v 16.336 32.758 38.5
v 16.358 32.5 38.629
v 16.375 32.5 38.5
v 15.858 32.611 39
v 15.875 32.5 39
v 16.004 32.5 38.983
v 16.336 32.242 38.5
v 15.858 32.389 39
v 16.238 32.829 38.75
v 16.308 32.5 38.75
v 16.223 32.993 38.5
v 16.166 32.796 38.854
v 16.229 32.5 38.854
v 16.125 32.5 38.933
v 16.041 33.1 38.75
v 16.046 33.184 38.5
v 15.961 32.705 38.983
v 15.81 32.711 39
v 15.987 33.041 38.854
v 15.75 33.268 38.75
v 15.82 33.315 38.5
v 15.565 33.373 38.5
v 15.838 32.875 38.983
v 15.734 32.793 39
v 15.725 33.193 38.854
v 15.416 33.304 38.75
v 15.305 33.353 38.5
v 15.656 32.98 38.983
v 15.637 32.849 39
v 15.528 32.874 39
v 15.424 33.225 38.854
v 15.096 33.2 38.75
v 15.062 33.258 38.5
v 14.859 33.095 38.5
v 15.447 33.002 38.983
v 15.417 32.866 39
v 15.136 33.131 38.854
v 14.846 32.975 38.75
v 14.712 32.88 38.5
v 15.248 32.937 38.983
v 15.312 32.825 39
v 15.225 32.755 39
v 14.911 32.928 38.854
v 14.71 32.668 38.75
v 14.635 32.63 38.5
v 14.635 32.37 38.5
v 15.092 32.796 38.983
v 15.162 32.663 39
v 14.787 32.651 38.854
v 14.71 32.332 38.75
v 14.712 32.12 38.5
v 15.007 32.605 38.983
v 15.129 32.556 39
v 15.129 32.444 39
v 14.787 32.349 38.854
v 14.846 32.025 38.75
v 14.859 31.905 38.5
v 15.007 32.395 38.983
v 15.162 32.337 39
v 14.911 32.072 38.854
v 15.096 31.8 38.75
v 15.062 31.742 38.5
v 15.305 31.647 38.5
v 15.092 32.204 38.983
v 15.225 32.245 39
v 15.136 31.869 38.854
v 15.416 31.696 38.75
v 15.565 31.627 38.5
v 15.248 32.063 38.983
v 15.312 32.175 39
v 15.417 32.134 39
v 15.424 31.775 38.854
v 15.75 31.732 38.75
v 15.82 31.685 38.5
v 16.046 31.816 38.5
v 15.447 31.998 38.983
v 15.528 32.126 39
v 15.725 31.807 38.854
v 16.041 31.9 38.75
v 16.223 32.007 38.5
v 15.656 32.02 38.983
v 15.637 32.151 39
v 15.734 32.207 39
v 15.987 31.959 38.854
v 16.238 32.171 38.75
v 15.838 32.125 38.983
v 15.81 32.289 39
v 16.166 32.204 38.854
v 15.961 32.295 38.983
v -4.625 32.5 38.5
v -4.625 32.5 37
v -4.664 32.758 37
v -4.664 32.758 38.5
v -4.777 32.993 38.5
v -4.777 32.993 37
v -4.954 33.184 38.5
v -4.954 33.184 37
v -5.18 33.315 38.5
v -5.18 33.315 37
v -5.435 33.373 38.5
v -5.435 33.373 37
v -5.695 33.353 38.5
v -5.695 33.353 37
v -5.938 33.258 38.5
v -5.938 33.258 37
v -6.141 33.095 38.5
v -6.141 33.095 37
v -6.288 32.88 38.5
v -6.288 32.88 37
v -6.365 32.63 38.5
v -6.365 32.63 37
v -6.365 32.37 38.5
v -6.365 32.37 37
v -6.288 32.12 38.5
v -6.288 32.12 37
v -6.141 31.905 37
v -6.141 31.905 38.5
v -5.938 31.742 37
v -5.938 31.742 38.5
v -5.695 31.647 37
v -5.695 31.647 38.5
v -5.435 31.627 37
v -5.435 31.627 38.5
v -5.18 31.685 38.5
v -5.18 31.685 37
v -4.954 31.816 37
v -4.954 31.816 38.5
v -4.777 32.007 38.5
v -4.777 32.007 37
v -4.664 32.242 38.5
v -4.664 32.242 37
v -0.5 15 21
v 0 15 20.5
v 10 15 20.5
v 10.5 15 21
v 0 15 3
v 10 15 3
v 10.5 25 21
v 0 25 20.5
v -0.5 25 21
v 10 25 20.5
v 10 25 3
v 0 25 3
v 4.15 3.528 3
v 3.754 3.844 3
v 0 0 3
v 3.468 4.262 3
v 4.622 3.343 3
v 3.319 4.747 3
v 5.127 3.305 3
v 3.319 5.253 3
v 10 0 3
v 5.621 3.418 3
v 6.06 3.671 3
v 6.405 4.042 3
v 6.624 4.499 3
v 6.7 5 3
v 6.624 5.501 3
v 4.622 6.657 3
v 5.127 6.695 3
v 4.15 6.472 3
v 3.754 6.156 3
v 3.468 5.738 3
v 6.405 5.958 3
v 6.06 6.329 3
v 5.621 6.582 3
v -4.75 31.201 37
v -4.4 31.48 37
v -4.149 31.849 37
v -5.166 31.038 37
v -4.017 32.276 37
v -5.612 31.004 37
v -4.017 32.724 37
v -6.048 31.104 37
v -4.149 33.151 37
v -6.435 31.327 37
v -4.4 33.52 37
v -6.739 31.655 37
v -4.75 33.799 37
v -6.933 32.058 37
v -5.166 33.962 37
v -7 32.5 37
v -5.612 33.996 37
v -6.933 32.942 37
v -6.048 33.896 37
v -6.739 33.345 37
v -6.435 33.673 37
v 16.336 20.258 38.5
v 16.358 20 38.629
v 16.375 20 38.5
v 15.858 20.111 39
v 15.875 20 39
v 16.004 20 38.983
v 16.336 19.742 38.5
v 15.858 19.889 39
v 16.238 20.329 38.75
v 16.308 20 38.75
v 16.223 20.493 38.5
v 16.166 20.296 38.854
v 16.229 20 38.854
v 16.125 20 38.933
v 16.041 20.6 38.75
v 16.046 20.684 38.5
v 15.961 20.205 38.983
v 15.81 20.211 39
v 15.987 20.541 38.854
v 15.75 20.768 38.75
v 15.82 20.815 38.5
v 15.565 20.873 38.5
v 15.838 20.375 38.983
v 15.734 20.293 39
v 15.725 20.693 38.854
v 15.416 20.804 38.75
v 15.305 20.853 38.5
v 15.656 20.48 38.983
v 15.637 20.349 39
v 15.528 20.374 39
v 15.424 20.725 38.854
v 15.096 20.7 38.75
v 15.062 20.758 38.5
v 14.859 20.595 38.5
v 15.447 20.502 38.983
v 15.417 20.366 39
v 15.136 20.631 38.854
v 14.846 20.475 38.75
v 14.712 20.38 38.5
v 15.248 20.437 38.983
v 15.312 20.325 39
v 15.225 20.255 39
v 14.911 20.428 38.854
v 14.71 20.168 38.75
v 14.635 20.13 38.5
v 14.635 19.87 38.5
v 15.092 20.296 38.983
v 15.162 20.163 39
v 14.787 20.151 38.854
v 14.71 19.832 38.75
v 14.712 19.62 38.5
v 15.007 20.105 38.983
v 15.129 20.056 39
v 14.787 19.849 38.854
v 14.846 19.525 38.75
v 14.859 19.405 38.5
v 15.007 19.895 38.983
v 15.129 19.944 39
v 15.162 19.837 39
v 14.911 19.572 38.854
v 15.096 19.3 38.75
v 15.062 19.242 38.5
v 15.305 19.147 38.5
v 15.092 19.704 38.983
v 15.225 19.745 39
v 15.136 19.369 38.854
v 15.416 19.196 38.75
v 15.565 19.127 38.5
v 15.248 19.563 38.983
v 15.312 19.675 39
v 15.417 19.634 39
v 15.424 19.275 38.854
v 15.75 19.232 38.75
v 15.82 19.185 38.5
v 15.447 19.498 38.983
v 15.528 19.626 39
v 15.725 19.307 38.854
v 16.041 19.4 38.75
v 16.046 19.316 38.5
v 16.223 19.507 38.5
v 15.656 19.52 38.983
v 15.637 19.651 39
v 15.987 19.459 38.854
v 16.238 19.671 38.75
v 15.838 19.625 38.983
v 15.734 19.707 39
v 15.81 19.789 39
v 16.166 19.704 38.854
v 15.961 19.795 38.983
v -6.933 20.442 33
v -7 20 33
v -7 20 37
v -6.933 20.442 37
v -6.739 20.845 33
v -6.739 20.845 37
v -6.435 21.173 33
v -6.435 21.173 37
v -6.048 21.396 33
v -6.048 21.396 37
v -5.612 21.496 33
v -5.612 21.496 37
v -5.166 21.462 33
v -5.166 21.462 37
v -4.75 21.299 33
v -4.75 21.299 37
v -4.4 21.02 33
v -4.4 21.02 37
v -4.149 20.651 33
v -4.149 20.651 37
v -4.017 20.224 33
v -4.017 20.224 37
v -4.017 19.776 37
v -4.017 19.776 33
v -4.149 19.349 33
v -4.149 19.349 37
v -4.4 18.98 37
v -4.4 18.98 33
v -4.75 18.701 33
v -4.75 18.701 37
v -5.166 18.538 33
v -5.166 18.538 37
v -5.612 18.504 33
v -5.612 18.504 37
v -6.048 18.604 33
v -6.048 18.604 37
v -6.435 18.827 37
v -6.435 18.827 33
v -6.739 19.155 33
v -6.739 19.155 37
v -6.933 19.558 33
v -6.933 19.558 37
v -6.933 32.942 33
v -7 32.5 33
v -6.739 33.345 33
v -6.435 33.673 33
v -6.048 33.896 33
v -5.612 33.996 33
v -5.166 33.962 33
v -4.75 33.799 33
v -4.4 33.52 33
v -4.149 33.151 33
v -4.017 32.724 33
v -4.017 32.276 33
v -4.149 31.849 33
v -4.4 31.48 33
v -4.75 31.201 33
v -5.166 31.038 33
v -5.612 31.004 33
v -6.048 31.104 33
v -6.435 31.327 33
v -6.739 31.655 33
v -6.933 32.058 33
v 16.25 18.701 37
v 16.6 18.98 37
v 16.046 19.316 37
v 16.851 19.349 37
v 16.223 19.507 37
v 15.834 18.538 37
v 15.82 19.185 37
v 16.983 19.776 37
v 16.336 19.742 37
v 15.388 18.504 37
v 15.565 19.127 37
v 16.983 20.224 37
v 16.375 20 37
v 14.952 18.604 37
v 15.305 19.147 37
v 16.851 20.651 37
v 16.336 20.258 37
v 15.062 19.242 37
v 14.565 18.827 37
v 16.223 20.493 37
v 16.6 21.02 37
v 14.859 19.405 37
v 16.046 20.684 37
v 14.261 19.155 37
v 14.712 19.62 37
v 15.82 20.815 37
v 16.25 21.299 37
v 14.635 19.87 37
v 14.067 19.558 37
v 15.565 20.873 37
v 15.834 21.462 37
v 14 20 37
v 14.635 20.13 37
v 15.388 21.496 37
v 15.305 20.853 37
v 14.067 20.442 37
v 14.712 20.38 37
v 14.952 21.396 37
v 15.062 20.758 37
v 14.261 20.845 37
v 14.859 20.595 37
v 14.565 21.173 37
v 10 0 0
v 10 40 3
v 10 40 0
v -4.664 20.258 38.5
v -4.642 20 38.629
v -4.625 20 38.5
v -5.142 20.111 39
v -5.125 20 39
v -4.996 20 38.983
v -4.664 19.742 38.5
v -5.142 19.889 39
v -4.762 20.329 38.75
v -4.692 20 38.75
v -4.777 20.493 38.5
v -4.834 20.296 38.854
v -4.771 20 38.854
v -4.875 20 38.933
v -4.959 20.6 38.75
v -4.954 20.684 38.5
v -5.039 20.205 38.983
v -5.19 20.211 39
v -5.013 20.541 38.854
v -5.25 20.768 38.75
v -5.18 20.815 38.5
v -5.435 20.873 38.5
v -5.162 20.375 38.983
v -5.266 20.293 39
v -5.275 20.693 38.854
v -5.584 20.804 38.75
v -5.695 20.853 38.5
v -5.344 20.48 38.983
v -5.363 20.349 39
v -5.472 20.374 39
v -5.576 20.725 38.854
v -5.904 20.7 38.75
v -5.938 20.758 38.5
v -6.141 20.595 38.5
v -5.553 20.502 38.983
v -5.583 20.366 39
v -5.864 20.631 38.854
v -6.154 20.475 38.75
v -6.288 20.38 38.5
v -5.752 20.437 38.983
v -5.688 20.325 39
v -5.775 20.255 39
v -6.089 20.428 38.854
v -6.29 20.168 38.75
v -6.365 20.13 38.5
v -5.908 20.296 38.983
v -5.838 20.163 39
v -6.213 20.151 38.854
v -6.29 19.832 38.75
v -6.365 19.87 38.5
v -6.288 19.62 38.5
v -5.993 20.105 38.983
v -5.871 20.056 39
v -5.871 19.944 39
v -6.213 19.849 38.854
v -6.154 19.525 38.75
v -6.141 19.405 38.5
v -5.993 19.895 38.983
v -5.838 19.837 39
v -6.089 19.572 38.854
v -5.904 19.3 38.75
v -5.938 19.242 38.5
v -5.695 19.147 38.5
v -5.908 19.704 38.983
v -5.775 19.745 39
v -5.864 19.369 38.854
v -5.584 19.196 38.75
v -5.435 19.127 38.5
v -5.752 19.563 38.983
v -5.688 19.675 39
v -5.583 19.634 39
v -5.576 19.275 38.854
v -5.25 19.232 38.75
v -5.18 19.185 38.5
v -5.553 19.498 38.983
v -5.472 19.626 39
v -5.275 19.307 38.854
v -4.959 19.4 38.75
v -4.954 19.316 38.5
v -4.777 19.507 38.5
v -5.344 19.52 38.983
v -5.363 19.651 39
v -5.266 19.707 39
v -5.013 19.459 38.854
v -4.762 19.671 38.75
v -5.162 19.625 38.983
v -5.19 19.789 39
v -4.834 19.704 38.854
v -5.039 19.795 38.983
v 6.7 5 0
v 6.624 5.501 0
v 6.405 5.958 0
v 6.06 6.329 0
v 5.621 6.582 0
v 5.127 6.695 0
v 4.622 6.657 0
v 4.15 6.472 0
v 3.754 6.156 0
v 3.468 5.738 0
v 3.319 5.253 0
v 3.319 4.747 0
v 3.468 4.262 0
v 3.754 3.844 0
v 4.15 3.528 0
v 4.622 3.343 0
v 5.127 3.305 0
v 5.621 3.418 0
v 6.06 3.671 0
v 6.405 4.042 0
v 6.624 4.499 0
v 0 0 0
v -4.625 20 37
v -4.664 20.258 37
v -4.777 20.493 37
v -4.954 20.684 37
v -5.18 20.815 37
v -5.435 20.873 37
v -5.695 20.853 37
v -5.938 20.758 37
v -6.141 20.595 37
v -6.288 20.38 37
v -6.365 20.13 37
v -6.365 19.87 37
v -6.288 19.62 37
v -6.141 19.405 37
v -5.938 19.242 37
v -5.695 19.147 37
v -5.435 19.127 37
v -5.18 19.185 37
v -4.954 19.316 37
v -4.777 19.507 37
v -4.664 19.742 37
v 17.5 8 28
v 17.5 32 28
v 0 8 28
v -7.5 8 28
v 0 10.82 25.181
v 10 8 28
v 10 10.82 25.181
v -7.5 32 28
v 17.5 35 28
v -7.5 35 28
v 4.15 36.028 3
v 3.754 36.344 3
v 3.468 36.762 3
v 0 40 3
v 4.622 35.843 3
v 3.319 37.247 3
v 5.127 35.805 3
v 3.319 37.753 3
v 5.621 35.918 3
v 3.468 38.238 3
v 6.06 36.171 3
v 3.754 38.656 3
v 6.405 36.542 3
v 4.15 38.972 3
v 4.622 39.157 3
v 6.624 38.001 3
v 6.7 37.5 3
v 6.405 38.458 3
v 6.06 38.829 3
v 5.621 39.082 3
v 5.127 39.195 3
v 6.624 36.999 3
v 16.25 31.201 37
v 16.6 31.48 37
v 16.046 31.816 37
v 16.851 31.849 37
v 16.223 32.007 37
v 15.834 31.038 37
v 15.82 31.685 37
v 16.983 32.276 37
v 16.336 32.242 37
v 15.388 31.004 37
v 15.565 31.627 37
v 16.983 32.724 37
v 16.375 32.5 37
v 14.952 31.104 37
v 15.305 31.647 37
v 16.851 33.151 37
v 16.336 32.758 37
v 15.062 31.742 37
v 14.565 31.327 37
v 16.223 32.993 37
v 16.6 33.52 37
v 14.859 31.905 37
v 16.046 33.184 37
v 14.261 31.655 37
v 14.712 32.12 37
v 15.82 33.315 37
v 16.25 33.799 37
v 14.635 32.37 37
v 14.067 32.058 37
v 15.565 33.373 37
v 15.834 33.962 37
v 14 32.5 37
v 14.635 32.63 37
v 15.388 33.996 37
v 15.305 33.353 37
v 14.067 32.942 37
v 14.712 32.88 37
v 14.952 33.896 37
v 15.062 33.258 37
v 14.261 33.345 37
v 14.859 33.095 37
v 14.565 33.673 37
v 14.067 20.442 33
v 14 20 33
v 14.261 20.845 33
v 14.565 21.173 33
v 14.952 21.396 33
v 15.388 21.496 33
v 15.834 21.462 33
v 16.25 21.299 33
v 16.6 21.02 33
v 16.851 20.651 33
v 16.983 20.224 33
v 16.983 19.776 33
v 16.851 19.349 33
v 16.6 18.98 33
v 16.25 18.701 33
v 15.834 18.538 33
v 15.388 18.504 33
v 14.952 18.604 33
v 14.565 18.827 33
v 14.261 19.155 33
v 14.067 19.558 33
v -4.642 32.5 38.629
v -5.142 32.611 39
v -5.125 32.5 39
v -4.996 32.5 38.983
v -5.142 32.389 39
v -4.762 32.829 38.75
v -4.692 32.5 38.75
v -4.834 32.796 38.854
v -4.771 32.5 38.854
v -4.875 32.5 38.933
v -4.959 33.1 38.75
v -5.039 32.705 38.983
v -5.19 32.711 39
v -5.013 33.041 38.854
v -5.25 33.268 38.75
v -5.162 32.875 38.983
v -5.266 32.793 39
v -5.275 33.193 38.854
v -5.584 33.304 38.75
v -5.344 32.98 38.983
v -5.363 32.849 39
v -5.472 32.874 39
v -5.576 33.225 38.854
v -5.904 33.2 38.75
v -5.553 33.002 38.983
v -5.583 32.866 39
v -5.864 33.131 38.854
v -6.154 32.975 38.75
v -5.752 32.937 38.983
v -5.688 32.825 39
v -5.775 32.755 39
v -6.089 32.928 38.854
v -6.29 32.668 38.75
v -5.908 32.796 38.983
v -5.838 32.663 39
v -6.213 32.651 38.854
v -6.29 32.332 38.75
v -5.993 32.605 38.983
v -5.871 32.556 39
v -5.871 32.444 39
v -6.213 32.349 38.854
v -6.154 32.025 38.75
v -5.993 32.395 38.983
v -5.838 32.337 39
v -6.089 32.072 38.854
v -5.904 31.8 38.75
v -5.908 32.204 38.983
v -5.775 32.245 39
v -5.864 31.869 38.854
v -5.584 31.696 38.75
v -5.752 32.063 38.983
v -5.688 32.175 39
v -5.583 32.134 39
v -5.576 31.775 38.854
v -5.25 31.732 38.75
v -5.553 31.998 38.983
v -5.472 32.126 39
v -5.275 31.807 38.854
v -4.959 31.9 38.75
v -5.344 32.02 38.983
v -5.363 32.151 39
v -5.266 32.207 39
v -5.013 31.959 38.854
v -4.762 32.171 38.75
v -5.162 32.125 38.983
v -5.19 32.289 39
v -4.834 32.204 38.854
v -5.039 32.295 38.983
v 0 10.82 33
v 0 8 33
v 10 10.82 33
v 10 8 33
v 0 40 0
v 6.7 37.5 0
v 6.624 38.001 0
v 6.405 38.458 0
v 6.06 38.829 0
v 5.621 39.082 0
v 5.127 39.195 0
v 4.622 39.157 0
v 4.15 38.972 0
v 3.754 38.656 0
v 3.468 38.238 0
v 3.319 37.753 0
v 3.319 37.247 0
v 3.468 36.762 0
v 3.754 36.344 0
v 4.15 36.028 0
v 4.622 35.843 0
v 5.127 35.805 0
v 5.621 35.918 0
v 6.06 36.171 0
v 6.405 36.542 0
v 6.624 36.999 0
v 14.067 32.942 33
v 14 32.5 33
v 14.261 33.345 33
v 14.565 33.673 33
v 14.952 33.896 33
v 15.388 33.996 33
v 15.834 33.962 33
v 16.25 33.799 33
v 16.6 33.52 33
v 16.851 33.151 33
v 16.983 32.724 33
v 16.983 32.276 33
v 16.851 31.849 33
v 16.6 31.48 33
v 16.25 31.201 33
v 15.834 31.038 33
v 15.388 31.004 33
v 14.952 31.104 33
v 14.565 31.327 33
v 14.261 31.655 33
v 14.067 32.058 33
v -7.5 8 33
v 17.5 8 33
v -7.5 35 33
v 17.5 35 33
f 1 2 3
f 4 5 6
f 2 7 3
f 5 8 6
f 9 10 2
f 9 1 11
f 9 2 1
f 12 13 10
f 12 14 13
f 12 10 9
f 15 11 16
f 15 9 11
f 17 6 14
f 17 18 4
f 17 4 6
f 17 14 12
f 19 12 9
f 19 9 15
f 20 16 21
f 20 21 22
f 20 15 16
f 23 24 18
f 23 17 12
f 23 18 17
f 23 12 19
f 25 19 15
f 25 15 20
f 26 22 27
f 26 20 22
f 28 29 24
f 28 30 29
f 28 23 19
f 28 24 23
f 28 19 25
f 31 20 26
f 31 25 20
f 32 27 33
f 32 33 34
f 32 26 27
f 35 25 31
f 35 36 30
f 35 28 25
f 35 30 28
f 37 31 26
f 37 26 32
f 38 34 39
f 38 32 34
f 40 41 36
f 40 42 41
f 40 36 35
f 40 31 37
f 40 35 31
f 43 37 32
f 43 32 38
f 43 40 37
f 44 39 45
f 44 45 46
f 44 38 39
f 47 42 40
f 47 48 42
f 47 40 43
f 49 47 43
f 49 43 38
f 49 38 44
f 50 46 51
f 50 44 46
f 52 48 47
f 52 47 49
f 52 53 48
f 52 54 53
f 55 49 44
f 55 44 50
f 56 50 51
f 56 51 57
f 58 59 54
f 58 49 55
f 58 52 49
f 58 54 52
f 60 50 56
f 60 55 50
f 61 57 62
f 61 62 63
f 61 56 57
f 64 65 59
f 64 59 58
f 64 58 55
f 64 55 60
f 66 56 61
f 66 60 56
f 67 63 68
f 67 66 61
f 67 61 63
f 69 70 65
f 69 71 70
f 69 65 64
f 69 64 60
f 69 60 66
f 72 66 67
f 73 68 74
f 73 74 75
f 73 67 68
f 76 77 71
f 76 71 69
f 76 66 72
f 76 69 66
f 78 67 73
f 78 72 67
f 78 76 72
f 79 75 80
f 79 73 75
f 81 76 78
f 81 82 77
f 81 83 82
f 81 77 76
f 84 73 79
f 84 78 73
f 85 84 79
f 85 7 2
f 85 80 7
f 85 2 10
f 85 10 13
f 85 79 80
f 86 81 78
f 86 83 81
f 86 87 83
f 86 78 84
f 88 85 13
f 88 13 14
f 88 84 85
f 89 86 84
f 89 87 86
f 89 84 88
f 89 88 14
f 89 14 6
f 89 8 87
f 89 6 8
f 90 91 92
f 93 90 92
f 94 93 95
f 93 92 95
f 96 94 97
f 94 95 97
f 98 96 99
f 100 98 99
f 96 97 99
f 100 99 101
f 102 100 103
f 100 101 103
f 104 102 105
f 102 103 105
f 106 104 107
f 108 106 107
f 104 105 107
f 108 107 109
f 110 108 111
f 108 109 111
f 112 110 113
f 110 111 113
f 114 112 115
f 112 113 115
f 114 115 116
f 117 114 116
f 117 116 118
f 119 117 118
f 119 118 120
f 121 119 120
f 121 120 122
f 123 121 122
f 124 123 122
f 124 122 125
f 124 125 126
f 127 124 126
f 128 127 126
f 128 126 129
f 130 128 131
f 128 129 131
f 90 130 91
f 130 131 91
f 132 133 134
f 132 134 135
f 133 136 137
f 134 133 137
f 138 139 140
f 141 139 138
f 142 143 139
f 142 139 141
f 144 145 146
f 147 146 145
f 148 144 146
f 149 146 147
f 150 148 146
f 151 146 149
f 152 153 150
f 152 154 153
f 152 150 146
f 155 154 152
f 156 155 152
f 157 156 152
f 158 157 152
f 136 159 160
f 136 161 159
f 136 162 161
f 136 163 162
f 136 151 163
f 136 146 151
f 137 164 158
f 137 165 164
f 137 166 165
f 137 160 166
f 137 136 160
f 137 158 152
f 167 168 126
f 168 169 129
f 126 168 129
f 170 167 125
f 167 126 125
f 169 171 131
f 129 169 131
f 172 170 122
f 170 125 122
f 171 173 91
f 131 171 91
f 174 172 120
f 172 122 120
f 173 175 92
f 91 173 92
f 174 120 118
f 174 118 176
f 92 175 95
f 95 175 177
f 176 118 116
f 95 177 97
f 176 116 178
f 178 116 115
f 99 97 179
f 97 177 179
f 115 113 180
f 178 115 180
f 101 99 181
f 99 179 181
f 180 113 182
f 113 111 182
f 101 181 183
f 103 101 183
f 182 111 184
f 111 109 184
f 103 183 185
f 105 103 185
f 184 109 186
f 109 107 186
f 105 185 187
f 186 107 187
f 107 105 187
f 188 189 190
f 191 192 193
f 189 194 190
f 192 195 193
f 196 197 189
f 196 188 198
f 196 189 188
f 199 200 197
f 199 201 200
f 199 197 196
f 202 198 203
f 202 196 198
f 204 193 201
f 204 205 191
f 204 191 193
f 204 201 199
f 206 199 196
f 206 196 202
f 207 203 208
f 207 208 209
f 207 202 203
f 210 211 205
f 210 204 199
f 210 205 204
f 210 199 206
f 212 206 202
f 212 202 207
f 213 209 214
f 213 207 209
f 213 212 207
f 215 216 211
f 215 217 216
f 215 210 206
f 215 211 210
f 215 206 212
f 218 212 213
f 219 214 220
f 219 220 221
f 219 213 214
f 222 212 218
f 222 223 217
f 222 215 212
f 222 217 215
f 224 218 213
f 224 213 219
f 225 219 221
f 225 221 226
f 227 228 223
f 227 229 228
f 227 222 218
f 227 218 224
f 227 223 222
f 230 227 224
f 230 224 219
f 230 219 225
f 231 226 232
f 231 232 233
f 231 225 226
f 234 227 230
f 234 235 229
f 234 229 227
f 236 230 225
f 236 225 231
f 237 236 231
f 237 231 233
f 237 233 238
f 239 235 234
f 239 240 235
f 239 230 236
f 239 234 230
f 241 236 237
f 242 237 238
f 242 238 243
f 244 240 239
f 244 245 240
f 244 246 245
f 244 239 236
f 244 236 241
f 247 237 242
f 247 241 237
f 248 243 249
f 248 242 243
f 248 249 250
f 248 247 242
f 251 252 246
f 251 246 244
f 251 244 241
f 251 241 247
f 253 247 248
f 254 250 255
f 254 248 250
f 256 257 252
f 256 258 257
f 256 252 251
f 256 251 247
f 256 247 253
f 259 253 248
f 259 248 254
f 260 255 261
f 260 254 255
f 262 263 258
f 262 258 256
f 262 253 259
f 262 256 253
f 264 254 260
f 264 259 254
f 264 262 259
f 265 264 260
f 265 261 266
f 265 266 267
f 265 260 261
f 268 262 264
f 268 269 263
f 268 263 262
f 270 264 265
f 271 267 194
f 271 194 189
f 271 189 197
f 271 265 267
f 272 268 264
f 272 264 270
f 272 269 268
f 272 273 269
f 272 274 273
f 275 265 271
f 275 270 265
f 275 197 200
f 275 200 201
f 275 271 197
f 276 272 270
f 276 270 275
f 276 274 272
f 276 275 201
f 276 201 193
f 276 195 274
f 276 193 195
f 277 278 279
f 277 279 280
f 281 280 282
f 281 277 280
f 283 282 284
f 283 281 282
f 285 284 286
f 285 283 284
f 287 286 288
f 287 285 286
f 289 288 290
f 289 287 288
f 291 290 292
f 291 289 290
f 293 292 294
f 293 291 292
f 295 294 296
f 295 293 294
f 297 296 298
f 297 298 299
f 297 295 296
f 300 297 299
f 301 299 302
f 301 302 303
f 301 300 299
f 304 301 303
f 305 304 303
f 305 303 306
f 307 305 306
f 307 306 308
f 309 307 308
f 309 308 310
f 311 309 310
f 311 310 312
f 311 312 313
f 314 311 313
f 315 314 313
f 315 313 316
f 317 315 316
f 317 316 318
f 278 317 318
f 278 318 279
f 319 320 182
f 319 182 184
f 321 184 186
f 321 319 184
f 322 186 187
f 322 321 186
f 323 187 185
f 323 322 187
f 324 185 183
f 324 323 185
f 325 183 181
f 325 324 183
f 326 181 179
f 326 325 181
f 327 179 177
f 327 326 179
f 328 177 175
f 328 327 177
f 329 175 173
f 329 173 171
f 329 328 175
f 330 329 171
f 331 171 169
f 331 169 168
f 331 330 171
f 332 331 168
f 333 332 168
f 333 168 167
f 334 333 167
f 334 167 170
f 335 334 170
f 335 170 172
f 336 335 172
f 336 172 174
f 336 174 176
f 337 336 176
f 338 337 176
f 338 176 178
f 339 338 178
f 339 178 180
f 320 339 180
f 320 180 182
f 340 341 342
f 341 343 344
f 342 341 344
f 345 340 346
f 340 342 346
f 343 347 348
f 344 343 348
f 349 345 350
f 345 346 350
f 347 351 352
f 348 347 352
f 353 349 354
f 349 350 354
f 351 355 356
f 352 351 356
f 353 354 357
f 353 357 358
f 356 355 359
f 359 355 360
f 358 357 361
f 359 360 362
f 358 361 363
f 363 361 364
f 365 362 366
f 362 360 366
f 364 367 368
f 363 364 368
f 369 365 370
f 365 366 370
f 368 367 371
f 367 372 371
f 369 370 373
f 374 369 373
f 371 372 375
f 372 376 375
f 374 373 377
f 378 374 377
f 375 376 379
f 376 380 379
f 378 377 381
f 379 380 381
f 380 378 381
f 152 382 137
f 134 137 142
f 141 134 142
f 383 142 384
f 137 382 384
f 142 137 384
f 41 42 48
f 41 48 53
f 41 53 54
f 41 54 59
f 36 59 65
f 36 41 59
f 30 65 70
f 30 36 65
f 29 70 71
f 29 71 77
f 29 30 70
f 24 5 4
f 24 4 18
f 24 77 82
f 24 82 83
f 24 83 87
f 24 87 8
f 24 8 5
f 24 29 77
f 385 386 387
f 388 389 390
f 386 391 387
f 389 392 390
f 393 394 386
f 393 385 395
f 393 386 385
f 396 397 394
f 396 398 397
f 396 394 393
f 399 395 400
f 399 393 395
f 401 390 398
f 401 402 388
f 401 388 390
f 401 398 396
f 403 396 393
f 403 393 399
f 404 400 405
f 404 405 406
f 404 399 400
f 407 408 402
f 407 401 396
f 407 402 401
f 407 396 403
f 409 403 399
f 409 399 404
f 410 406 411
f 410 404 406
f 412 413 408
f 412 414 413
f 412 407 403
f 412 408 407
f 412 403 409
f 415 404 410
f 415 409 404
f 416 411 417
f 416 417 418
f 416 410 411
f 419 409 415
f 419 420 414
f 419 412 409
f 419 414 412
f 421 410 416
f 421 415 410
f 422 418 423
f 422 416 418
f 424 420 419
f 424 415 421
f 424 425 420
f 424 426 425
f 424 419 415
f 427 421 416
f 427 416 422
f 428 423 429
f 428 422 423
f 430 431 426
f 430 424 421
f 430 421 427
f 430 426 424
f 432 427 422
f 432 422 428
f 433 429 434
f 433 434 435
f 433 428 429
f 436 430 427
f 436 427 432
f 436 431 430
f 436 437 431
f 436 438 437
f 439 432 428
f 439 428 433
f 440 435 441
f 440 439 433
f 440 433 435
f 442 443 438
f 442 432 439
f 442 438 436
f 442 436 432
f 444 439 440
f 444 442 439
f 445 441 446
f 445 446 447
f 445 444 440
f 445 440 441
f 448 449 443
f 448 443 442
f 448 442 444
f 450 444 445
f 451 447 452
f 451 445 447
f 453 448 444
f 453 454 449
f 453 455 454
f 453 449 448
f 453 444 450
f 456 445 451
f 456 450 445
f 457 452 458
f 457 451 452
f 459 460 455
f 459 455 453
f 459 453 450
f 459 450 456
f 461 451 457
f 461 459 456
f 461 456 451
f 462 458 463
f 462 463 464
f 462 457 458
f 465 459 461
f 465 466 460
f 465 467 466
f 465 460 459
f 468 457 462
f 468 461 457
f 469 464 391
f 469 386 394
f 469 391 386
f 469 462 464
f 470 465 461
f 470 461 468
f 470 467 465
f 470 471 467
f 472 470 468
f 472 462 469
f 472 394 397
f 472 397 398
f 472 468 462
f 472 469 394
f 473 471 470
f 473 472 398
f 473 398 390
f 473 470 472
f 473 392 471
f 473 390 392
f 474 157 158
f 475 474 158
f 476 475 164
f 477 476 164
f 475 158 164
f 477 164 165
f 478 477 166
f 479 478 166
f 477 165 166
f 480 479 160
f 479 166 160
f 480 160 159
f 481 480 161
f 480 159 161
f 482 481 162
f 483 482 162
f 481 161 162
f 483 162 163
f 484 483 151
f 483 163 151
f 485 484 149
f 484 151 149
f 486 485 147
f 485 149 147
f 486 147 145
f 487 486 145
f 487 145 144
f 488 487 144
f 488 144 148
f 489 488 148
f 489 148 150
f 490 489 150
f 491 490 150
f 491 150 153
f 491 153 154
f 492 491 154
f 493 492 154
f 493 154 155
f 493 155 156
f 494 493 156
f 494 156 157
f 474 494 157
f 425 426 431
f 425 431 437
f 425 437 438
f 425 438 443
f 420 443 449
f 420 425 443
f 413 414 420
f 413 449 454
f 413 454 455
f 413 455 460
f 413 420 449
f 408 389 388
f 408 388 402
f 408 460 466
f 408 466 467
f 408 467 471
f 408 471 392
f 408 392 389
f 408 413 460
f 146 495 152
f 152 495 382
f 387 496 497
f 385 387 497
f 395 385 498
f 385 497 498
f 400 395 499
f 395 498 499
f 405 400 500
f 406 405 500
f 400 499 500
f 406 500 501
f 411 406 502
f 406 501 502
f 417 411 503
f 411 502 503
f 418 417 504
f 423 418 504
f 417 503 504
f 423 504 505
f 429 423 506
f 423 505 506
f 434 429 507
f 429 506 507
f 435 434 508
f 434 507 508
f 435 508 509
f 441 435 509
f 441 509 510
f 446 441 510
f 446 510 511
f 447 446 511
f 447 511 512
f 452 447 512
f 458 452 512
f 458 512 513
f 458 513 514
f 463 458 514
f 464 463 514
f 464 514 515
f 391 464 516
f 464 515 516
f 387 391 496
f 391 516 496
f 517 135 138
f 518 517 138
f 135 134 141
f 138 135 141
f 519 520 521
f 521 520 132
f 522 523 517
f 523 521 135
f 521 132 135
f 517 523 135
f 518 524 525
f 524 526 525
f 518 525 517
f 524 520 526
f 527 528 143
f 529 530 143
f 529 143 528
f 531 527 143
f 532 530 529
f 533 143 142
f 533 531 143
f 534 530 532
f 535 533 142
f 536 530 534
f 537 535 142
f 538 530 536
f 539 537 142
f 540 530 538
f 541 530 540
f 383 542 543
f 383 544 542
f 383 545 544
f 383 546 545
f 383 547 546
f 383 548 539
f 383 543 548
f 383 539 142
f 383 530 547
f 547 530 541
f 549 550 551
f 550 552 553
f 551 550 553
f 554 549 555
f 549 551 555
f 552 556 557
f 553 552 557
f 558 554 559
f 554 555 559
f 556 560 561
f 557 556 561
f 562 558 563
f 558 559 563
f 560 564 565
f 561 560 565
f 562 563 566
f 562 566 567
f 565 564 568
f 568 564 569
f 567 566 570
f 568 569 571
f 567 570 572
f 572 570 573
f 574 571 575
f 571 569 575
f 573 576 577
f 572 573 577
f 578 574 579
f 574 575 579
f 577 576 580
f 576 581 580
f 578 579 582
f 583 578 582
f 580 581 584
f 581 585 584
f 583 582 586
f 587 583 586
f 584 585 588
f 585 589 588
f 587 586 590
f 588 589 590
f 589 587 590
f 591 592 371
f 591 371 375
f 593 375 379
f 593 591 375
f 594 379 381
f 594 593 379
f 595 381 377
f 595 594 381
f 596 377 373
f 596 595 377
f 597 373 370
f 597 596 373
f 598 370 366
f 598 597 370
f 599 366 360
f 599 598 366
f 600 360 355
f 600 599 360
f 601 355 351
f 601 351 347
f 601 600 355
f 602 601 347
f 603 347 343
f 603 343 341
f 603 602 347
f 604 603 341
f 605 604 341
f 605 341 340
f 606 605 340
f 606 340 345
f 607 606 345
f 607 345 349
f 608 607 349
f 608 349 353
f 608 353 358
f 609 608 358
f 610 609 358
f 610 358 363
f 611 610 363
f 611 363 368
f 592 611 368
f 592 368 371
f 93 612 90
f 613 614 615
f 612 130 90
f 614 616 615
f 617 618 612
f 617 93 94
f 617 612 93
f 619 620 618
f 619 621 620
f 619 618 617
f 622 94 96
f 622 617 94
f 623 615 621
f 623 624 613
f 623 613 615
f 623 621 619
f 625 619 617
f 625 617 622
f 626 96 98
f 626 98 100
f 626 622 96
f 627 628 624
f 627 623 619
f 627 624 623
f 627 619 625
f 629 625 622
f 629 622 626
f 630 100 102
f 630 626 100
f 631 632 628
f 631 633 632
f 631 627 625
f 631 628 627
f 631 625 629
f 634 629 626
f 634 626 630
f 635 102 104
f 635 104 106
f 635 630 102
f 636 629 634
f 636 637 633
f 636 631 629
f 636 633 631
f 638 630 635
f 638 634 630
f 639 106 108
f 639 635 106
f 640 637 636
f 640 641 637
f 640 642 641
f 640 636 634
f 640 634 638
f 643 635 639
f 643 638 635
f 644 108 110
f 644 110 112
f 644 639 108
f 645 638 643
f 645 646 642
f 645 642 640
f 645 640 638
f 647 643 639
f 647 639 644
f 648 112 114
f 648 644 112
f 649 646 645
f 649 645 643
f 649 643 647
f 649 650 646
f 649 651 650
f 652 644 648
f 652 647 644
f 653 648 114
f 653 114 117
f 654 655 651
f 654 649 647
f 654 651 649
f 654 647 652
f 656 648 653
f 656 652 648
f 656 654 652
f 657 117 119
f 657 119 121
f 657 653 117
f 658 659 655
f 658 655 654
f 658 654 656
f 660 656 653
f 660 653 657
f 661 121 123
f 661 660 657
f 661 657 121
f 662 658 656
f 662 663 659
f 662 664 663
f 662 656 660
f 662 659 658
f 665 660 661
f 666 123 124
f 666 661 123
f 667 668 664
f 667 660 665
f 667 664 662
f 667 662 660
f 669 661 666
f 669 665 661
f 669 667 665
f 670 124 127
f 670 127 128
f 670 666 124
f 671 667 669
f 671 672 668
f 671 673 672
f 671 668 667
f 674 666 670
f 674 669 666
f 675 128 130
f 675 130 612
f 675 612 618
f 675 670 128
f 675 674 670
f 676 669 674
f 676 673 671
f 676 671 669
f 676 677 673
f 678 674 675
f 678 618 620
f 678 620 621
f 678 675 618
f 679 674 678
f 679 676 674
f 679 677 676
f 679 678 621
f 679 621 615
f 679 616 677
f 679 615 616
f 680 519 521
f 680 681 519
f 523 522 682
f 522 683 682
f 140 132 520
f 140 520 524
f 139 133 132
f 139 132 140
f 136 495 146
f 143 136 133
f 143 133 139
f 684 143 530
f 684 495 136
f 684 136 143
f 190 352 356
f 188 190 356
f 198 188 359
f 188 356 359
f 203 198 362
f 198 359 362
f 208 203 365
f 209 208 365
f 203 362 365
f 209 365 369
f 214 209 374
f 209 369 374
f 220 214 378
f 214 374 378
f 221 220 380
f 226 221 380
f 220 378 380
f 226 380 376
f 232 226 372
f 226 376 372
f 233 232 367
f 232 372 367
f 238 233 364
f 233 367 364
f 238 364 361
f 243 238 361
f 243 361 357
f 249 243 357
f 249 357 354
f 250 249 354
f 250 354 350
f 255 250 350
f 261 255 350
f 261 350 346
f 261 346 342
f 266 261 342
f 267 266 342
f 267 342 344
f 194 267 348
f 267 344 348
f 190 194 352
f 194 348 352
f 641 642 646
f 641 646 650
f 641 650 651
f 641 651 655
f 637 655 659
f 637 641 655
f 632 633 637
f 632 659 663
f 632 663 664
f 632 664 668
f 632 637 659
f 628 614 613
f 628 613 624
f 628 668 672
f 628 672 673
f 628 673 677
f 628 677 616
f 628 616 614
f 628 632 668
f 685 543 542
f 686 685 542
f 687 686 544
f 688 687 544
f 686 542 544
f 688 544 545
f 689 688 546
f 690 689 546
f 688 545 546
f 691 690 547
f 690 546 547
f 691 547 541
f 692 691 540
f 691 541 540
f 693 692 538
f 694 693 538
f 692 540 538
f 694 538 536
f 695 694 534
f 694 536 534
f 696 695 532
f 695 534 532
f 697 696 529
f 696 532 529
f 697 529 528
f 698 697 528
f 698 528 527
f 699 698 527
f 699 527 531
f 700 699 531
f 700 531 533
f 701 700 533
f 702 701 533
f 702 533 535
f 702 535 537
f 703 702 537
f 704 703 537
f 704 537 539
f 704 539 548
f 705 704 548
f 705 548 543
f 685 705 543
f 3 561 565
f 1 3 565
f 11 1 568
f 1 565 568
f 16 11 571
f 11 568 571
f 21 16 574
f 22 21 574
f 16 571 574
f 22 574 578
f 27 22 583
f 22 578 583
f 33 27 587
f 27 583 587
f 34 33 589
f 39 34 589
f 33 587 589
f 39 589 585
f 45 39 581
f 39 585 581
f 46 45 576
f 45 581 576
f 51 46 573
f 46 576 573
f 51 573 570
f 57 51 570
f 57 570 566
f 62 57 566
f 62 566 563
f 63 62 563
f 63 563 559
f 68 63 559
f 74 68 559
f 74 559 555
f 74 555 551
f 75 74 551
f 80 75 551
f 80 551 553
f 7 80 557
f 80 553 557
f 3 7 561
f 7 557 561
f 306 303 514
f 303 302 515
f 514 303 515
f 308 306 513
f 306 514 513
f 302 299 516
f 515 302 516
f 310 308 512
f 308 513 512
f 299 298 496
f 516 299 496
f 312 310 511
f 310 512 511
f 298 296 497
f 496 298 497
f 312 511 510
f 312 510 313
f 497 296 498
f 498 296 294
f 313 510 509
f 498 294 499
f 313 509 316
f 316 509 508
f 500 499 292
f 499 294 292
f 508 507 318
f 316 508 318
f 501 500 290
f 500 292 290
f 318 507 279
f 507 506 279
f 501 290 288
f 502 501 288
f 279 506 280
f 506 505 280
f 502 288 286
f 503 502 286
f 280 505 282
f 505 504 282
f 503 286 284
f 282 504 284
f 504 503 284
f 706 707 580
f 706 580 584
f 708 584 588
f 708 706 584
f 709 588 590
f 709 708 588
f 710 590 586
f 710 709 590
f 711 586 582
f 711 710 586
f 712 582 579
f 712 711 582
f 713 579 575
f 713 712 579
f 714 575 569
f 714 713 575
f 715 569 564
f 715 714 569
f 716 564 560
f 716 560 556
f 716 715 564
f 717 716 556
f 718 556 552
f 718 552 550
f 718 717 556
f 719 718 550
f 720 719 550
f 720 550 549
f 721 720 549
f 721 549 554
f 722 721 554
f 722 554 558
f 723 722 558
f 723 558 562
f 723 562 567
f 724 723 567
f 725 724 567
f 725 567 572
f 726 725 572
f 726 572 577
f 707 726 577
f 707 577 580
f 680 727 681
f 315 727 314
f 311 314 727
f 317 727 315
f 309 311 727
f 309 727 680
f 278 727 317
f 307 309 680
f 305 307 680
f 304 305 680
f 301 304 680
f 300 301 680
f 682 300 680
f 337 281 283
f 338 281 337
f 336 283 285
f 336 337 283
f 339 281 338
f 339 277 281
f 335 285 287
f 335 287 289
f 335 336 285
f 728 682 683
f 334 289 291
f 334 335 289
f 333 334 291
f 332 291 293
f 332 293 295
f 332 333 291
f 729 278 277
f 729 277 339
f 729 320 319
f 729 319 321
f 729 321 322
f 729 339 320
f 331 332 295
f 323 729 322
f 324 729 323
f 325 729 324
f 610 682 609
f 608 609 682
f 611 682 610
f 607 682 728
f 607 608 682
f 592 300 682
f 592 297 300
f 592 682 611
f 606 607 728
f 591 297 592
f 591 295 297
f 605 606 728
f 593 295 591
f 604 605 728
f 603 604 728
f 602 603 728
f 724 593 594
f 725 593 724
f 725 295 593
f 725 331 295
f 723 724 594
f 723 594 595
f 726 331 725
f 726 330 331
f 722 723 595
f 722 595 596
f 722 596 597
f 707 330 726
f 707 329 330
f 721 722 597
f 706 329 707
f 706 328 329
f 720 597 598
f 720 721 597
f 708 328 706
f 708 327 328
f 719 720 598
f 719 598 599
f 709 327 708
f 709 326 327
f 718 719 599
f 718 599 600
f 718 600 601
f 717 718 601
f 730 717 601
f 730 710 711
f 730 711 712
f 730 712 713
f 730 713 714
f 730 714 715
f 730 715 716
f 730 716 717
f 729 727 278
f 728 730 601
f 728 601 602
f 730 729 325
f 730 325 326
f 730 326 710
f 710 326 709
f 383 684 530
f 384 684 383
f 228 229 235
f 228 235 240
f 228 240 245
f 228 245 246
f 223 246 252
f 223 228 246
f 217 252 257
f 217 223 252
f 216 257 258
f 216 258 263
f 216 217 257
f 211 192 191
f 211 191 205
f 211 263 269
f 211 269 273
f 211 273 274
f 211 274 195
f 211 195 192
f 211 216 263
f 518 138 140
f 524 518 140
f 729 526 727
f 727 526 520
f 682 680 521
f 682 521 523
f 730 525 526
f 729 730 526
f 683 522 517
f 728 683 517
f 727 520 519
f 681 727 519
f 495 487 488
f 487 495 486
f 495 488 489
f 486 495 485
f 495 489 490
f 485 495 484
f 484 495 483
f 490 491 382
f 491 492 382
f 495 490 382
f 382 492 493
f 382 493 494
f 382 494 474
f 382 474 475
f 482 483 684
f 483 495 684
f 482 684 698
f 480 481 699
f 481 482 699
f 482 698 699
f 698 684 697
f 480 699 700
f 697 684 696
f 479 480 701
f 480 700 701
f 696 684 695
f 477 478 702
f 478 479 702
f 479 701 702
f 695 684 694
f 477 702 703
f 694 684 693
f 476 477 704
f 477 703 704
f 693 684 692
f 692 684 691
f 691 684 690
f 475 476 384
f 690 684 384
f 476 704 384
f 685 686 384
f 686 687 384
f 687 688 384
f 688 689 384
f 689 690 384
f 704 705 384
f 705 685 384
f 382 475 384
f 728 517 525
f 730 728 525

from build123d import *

# Parameters (mm, degrees)
SKETCH1_W           = 10
SKETCH1_H           = 40
BOSS_EXTRUDE1_DEPTH = 3
SKETCH2_R           = 1.7
CUT_EXTRUDE1_DEPTH  = 7
SKETCH3_W           = 10
SKETCH3_H           = 10
BOSS_EXTRUDE2_DEPTH = 25
SKETCH7_R           = 1
BOSS_EXTRUDE3_DEPTH = 5
SKETCH9_R           = 1.5
BOSS_EXTRUDE4_DEPTH = 9
SKETCH10_R          = 0.875
BOSS_EXTRUDE5_DEPTH = 2
FILLET1_R           = 0.5
CHAMFER1_SIZE       = 7.5
CHAMFER2_SIZE       = 7
SKETCH11_W          = 10
SKETCH11_H          = 2.819588602
CUT_EXTRUDE2_DEPTH  = 10


with BuildPart() as part:
    # Sketch1 → Boss-Extrude1 (new body)
    with BuildSketch(Plane.XY):
        with Locations((5, 20)):
            Rectangle(SKETCH1_W, SKETCH1_H)
    extrude(amount=BOSS_EXTRUDE1_DEPTH)

    # Sketch2 → Cut-Extrude1 (cut)
    with BuildSketch(Plane.XY.offset(3)):
        with Locations((5, 37.5)):
            Circle(SKETCH2_R)
        with Locations((5, 5)):
            Circle(SKETCH2_R)
    extrude(amount=-CUT_EXTRUDE1_DEPTH, mode=Mode.SUBTRACT)

    # Sketch3 → Boss-Extrude2 (add)
    with BuildSketch(Plane.XY.offset(3)):
        with Locations((5, 20)):
            Rectangle(SKETCH3_W, SKETCH3_H)
    extrude(amount=BOSS_EXTRUDE2_DEPTH)

    # Sketch7 → Boss-Extrude3 (add)
    with BuildSketch(Plane.XY.offset(28)):
        Polygon((-7.5, 8), (17.5, 8), (17.5, 32), (17.5, 35), (-7.5, 35), (-7.5, 32), align=None)
        with Locations((-5.5, 20)):
            Circle(SKETCH7_R, mode=Mode.SUBTRACT)
        with Locations((15.5, 20)):
            Circle(SKETCH7_R, mode=Mode.SUBTRACT)
        with Locations((-5.5, 32.5)):
            Circle(SKETCH7_R, mode=Mode.SUBTRACT)
        with Locations((15.5, 32.5)):
            Circle(SKETCH7_R, mode=Mode.SUBTRACT)
    extrude(amount=BOSS_EXTRUDE3_DEPTH)

    # Sketch9 → Boss-Extrude4 (add)
    with BuildSketch(Plane(origin=(0, 0, 28), x_dir=(-1, 0, 0), z_dir=(0, 0, -1))):
        with Locations((5.5, 32.5)):
            Circle(SKETCH9_R)
        with Locations((-15.5, 32.5)):
            Circle(SKETCH9_R)
        with Locations((-15.5, 20)):
            Circle(SKETCH9_R)
        with Locations((5.5, 20)):
            Circle(SKETCH9_R)
    extrude(amount=-BOSS_EXTRUDE4_DEPTH)

    # Sketch10 → Boss-Extrude5 (add)
    with BuildSketch(Plane.XY.offset(37)):
        with Locations((-5.5, 32.5)):
            Circle(SKETCH10_R)
        with Locations((15.5, 32.5)):
            Circle(SKETCH10_R)
        with Locations((15.5, 20)):
            Circle(SKETCH10_R)
        with Locations((-5.5, 20)):
            Circle(SKETCH10_R)
    extrude(amount=BOSS_EXTRUDE5_DEPTH)

    # Fillet1
    fillet1_edges = [part.edges().sort_by_distance(p)[0] for p in [
        (-6.375, 20, 39),
        (14.625, 20, 39),
        (14.625, 32.5, 39),
        (-6.375, 32.5, 39),
    ]]
    fillet(fillet1_edges, radius=FILLET1_R)

    # Chamfer1
    chamfer1_edges = [part.edges().sort_by_distance(p)[0] for p in [
        (0, 20, 28),
        (10, 20, 28),
    ]]
    chamfer(chamfer1_edges, length=CHAMFER1_SIZE - 0.0001)  # a hair under: the kernel refuses the full size

    # Chamfer2
    chamfer2_edges = [part.edges().sort_by_distance(p)[0] for p in [
        (5, 15, 28),
        (5, 25, 28),
    ]]
    chamfer(chamfer2_edges, length=CHAMFER2_SIZE - 0.0001)  # a hair under: the kernel refuses the full size

    # Sketch11 → Cut-Extrude2 (cut)
    with BuildSketch(Plane.XY.offset(33)):
        with Locations((5, 9.409794301)):
            Rectangle(SKETCH11_W, SKETCH11_H)
    extrude(amount=-CUT_EXTRUDE2_DEPTH, mode=Mode.SUBTRACT)


solid = part.part
